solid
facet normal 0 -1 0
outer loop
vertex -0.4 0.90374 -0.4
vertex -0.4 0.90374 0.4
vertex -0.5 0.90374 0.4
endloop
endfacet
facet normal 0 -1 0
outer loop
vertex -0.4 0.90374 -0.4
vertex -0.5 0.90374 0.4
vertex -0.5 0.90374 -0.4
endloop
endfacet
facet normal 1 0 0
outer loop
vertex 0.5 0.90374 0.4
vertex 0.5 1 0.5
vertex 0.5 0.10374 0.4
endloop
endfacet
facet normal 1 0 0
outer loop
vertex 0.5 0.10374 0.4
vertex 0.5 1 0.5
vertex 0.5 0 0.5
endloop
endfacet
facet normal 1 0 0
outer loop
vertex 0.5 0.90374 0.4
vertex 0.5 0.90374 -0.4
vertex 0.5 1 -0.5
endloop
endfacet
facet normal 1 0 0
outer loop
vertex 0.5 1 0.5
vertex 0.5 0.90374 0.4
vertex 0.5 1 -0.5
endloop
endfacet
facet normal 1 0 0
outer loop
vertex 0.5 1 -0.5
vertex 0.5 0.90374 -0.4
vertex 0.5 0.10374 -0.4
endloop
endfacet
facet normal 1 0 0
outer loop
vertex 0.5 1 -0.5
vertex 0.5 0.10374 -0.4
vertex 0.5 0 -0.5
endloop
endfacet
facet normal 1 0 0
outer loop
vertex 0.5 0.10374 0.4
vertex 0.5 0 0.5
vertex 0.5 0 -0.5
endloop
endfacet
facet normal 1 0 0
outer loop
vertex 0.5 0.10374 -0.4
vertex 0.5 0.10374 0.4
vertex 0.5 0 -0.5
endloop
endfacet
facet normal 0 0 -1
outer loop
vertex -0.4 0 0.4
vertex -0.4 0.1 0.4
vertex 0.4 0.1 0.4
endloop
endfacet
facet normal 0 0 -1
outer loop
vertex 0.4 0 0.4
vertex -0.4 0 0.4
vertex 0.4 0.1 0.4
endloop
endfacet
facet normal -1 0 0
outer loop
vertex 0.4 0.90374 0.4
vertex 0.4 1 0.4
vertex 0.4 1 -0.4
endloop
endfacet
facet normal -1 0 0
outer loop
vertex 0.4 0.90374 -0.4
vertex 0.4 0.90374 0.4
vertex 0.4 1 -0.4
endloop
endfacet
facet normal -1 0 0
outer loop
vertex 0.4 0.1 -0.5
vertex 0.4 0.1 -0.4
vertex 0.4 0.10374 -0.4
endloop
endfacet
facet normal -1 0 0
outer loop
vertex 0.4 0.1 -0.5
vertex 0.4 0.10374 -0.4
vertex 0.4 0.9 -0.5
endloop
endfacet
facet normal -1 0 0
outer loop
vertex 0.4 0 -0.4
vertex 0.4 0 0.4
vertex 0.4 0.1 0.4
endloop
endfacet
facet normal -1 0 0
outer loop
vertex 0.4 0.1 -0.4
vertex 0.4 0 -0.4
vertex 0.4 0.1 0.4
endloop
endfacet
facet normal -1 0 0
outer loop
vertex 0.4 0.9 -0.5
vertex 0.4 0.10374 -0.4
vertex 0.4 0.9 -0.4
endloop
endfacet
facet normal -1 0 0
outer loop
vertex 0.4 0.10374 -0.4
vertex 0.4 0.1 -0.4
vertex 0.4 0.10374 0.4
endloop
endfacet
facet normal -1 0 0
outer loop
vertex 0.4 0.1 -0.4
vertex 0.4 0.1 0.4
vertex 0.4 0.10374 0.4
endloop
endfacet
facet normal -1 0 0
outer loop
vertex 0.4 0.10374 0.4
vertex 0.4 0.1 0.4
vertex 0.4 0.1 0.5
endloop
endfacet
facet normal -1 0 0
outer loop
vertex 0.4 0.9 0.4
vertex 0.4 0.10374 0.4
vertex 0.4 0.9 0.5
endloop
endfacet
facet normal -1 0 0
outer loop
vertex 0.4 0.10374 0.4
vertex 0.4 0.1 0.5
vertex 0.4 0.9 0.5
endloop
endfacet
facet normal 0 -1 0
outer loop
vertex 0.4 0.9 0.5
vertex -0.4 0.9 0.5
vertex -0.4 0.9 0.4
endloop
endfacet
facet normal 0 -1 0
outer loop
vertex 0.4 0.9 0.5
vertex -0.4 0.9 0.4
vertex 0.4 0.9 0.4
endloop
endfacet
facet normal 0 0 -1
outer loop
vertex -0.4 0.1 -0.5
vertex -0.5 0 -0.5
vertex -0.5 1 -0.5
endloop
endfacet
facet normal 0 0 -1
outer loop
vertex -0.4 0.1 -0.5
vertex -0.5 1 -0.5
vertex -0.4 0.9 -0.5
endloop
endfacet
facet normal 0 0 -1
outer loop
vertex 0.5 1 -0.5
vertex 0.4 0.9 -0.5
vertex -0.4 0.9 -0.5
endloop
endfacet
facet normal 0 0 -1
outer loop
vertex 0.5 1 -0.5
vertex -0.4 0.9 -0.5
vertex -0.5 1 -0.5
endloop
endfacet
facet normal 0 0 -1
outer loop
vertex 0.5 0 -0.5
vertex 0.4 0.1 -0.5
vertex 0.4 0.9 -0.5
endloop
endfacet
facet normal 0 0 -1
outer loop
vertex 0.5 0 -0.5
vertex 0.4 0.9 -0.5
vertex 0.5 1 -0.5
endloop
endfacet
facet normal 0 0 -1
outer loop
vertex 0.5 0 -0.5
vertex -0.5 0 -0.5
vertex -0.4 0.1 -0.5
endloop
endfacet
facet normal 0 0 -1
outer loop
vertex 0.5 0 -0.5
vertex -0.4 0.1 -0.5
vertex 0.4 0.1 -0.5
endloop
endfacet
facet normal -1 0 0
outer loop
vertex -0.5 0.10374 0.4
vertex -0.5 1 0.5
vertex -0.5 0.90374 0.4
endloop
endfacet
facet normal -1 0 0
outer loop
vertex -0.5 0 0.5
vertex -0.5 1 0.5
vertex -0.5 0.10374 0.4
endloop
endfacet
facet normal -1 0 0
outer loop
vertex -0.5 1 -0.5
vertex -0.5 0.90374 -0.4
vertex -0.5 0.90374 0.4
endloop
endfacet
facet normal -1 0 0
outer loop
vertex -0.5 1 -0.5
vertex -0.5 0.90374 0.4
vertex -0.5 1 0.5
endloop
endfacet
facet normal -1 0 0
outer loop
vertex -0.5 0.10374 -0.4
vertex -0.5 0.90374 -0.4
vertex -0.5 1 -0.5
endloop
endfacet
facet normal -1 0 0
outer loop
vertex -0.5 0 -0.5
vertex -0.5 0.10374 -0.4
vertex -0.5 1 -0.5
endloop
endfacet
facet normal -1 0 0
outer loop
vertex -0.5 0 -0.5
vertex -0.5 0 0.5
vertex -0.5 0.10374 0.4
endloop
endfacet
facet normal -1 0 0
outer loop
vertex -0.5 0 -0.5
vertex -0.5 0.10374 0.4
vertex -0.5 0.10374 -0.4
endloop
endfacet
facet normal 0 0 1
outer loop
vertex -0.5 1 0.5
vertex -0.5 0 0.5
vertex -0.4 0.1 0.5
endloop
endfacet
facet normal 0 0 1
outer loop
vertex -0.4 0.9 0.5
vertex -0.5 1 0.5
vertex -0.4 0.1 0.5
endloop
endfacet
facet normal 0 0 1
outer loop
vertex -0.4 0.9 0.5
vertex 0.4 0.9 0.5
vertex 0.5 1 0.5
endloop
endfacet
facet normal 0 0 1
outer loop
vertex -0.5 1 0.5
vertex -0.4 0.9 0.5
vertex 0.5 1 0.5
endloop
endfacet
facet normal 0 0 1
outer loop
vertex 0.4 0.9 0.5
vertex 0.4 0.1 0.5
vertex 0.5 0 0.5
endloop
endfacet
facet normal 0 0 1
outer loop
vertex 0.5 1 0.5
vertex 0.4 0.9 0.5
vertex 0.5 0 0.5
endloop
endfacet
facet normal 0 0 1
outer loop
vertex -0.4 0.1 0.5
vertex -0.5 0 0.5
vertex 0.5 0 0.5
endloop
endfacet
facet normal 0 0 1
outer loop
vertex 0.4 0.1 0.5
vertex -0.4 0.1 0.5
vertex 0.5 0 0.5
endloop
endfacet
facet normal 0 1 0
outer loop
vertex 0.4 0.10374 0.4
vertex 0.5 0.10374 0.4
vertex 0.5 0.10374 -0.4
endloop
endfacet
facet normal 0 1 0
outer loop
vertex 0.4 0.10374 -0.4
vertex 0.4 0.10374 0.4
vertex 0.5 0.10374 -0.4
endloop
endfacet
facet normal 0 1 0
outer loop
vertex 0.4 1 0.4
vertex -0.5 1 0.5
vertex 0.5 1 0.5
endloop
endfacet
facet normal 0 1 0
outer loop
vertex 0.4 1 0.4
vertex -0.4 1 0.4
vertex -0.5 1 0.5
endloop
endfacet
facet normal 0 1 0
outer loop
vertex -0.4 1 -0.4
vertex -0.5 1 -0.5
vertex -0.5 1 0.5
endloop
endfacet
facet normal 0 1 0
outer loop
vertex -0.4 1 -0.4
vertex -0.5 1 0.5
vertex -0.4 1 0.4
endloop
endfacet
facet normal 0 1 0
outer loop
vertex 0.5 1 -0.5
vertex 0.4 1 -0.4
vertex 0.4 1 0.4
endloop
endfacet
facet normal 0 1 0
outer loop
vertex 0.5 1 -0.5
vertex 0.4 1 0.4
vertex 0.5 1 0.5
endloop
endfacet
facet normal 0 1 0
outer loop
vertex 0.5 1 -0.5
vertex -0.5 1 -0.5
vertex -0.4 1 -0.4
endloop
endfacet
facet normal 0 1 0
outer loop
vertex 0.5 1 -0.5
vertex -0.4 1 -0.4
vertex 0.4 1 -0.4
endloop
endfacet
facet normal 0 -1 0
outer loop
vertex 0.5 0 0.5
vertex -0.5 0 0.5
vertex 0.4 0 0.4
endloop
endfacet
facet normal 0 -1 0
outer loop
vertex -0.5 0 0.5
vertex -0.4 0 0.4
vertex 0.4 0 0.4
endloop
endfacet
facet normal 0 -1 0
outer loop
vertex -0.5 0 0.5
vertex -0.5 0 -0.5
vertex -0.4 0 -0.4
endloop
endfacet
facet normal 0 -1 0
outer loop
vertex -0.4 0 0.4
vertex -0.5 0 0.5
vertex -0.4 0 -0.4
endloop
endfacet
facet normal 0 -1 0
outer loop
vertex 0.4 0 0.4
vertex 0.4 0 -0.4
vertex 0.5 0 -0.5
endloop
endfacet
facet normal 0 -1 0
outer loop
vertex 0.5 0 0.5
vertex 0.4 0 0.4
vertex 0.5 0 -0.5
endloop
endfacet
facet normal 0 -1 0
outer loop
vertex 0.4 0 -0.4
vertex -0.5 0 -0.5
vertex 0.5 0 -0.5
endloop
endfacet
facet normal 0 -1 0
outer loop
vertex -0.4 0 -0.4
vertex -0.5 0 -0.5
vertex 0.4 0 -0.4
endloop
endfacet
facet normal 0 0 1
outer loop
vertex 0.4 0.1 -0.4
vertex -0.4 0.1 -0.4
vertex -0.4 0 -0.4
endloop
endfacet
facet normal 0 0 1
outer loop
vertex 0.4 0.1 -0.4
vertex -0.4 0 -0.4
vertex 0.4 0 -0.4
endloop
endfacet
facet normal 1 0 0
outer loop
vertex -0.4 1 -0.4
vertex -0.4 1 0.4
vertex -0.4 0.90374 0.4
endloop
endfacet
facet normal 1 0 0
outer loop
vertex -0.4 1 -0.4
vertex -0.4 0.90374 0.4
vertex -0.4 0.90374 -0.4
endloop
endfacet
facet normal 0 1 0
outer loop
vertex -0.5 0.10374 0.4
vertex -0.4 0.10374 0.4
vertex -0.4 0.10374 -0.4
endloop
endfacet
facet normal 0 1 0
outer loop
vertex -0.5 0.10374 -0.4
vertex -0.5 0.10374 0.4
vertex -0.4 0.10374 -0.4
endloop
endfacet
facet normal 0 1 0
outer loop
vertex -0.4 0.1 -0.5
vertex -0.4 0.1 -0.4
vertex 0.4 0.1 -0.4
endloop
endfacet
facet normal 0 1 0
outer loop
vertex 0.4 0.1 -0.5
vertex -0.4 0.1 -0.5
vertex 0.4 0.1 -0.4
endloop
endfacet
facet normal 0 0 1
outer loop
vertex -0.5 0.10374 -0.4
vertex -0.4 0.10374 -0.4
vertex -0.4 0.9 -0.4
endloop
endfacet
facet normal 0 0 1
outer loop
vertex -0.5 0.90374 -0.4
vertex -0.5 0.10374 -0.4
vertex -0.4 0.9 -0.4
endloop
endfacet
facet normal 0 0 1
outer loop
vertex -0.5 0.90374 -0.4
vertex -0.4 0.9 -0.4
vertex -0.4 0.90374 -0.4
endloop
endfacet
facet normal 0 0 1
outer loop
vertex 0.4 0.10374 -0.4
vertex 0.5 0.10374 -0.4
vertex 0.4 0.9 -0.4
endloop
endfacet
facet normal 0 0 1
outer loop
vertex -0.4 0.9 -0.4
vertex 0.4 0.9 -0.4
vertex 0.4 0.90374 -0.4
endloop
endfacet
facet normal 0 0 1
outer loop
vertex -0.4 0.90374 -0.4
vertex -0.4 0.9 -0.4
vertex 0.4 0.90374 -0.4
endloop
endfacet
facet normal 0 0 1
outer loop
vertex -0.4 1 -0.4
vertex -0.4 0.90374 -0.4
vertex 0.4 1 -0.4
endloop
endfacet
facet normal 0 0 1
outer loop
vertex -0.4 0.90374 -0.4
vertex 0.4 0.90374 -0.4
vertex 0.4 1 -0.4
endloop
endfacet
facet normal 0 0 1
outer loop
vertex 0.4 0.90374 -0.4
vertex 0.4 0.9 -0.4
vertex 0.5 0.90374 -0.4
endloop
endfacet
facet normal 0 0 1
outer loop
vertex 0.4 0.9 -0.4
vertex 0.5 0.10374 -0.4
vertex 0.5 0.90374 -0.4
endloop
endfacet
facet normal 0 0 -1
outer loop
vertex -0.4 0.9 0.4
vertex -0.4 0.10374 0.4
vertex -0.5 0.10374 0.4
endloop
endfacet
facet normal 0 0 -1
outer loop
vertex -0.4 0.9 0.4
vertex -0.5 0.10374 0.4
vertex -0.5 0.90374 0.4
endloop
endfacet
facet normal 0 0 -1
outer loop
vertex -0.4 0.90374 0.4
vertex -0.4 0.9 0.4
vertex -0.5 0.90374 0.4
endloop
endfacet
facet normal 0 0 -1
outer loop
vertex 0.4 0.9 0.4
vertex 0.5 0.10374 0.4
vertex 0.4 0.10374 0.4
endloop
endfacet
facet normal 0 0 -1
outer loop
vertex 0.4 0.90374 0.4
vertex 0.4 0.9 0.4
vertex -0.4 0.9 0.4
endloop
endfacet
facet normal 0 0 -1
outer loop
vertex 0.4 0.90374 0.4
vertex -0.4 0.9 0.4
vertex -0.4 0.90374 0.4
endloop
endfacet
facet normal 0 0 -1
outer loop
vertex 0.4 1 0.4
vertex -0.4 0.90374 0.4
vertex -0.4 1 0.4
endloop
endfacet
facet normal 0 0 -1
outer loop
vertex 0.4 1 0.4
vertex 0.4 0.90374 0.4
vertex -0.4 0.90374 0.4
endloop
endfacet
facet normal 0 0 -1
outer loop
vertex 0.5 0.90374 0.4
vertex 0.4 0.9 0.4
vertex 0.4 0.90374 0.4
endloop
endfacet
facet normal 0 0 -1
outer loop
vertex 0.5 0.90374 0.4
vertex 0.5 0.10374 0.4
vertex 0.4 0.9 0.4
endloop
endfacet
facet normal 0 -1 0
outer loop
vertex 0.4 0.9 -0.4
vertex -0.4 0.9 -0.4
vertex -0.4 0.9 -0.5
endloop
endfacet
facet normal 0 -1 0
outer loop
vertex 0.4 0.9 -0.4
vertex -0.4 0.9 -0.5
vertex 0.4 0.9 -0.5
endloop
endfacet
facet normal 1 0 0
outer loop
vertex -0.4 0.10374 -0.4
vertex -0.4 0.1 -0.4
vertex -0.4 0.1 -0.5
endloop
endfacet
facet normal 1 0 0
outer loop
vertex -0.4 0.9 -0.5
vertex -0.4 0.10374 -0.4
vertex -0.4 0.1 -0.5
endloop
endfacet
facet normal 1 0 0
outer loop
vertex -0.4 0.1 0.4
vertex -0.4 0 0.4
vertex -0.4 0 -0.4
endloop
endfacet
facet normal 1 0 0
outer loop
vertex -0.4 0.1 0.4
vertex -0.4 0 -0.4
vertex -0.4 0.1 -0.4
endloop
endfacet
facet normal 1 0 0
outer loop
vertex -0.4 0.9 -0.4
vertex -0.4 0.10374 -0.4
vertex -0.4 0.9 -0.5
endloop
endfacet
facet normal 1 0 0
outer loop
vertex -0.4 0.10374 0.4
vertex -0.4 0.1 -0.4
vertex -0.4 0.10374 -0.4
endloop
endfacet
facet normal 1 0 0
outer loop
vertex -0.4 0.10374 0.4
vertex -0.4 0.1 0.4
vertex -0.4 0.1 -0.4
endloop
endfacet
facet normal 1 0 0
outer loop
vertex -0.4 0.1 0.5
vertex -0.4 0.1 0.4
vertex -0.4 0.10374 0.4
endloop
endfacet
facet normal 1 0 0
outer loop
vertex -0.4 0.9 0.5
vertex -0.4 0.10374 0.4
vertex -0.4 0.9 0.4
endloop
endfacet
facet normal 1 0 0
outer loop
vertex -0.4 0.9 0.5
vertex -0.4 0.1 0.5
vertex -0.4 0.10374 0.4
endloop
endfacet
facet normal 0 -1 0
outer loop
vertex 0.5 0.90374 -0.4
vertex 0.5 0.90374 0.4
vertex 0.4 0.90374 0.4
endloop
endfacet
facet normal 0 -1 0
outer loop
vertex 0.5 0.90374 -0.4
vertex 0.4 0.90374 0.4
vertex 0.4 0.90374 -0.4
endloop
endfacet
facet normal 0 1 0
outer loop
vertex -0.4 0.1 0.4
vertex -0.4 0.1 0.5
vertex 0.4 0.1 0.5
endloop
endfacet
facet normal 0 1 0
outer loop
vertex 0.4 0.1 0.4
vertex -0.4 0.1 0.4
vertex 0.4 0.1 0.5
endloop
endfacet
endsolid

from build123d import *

# Parameters (mm, degrees)
SKETCH1_W           = 1
SKETCH1_H           = 1
BOSS_EXTRUDE1_DEPTH = 1
SKETCH2_W           = 0.8
SKETCH2_H           = 0.8
CUT_EXTRUDE2_DEPTH  = 2.5
SKETCH3_W           = 0.8
SKETCH3_H           = 0.8
CUT_EXTRUDE3_DEPTH  = 2.5
SKETCH4_W           = 0.8
SKETCH4_H           = 0.8
CUT_EXTRUDE4_DEPTH  = 2.224744871


with BuildPart() as part:
    # Sketch1 → Boss-Extrude1 (new body)
    with BuildSketch(Plane(origin=(0, 0, 0), x_dir=(1, 0, 0), z_dir=(0, 1, 0))):
        Rectangle(SKETCH1_W, SKETCH1_H)
    extrude(amount=BOSS_EXTRUDE1_DEPTH)

    # Sketch2 → Cut-Extrude2 (cut, through all)
    with BuildSketch(Plane(origin=(0.5, 0, 0), x_dir=(0, 0, -1), z_dir=(1, 0, 0))):
        with Locations((0, 0.503735105)):
            Rectangle(SKETCH2_W, SKETCH2_H)
    extrude(amount=-CUT_EXTRUDE2_DEPTH, mode=Mode.SUBTRACT)

    # Sketch3 → Cut-Extrude3 (cut, through all)
    with BuildSketch(Plane.XY.offset(0.5)):
        with Locations((0, 0.5)):
            Rectangle(SKETCH3_W, SKETCH3_H)
    extrude(amount=-CUT_EXTRUDE3_DEPTH, mode=Mode.SUBTRACT)

    # Sketch4 → Cut-Extrude4 (cut, through all)
    with BuildSketch(Plane(origin=(0, 1, 0), x_dir=(1, 0, 0), z_dir=(0, 1, 0))):
        Rectangle(SKETCH4_W, SKETCH4_H)
    extrude(amount=-CUT_EXTRUDE4_DEPTH, mode=Mode.SUBTRACT)


solid = part.part
